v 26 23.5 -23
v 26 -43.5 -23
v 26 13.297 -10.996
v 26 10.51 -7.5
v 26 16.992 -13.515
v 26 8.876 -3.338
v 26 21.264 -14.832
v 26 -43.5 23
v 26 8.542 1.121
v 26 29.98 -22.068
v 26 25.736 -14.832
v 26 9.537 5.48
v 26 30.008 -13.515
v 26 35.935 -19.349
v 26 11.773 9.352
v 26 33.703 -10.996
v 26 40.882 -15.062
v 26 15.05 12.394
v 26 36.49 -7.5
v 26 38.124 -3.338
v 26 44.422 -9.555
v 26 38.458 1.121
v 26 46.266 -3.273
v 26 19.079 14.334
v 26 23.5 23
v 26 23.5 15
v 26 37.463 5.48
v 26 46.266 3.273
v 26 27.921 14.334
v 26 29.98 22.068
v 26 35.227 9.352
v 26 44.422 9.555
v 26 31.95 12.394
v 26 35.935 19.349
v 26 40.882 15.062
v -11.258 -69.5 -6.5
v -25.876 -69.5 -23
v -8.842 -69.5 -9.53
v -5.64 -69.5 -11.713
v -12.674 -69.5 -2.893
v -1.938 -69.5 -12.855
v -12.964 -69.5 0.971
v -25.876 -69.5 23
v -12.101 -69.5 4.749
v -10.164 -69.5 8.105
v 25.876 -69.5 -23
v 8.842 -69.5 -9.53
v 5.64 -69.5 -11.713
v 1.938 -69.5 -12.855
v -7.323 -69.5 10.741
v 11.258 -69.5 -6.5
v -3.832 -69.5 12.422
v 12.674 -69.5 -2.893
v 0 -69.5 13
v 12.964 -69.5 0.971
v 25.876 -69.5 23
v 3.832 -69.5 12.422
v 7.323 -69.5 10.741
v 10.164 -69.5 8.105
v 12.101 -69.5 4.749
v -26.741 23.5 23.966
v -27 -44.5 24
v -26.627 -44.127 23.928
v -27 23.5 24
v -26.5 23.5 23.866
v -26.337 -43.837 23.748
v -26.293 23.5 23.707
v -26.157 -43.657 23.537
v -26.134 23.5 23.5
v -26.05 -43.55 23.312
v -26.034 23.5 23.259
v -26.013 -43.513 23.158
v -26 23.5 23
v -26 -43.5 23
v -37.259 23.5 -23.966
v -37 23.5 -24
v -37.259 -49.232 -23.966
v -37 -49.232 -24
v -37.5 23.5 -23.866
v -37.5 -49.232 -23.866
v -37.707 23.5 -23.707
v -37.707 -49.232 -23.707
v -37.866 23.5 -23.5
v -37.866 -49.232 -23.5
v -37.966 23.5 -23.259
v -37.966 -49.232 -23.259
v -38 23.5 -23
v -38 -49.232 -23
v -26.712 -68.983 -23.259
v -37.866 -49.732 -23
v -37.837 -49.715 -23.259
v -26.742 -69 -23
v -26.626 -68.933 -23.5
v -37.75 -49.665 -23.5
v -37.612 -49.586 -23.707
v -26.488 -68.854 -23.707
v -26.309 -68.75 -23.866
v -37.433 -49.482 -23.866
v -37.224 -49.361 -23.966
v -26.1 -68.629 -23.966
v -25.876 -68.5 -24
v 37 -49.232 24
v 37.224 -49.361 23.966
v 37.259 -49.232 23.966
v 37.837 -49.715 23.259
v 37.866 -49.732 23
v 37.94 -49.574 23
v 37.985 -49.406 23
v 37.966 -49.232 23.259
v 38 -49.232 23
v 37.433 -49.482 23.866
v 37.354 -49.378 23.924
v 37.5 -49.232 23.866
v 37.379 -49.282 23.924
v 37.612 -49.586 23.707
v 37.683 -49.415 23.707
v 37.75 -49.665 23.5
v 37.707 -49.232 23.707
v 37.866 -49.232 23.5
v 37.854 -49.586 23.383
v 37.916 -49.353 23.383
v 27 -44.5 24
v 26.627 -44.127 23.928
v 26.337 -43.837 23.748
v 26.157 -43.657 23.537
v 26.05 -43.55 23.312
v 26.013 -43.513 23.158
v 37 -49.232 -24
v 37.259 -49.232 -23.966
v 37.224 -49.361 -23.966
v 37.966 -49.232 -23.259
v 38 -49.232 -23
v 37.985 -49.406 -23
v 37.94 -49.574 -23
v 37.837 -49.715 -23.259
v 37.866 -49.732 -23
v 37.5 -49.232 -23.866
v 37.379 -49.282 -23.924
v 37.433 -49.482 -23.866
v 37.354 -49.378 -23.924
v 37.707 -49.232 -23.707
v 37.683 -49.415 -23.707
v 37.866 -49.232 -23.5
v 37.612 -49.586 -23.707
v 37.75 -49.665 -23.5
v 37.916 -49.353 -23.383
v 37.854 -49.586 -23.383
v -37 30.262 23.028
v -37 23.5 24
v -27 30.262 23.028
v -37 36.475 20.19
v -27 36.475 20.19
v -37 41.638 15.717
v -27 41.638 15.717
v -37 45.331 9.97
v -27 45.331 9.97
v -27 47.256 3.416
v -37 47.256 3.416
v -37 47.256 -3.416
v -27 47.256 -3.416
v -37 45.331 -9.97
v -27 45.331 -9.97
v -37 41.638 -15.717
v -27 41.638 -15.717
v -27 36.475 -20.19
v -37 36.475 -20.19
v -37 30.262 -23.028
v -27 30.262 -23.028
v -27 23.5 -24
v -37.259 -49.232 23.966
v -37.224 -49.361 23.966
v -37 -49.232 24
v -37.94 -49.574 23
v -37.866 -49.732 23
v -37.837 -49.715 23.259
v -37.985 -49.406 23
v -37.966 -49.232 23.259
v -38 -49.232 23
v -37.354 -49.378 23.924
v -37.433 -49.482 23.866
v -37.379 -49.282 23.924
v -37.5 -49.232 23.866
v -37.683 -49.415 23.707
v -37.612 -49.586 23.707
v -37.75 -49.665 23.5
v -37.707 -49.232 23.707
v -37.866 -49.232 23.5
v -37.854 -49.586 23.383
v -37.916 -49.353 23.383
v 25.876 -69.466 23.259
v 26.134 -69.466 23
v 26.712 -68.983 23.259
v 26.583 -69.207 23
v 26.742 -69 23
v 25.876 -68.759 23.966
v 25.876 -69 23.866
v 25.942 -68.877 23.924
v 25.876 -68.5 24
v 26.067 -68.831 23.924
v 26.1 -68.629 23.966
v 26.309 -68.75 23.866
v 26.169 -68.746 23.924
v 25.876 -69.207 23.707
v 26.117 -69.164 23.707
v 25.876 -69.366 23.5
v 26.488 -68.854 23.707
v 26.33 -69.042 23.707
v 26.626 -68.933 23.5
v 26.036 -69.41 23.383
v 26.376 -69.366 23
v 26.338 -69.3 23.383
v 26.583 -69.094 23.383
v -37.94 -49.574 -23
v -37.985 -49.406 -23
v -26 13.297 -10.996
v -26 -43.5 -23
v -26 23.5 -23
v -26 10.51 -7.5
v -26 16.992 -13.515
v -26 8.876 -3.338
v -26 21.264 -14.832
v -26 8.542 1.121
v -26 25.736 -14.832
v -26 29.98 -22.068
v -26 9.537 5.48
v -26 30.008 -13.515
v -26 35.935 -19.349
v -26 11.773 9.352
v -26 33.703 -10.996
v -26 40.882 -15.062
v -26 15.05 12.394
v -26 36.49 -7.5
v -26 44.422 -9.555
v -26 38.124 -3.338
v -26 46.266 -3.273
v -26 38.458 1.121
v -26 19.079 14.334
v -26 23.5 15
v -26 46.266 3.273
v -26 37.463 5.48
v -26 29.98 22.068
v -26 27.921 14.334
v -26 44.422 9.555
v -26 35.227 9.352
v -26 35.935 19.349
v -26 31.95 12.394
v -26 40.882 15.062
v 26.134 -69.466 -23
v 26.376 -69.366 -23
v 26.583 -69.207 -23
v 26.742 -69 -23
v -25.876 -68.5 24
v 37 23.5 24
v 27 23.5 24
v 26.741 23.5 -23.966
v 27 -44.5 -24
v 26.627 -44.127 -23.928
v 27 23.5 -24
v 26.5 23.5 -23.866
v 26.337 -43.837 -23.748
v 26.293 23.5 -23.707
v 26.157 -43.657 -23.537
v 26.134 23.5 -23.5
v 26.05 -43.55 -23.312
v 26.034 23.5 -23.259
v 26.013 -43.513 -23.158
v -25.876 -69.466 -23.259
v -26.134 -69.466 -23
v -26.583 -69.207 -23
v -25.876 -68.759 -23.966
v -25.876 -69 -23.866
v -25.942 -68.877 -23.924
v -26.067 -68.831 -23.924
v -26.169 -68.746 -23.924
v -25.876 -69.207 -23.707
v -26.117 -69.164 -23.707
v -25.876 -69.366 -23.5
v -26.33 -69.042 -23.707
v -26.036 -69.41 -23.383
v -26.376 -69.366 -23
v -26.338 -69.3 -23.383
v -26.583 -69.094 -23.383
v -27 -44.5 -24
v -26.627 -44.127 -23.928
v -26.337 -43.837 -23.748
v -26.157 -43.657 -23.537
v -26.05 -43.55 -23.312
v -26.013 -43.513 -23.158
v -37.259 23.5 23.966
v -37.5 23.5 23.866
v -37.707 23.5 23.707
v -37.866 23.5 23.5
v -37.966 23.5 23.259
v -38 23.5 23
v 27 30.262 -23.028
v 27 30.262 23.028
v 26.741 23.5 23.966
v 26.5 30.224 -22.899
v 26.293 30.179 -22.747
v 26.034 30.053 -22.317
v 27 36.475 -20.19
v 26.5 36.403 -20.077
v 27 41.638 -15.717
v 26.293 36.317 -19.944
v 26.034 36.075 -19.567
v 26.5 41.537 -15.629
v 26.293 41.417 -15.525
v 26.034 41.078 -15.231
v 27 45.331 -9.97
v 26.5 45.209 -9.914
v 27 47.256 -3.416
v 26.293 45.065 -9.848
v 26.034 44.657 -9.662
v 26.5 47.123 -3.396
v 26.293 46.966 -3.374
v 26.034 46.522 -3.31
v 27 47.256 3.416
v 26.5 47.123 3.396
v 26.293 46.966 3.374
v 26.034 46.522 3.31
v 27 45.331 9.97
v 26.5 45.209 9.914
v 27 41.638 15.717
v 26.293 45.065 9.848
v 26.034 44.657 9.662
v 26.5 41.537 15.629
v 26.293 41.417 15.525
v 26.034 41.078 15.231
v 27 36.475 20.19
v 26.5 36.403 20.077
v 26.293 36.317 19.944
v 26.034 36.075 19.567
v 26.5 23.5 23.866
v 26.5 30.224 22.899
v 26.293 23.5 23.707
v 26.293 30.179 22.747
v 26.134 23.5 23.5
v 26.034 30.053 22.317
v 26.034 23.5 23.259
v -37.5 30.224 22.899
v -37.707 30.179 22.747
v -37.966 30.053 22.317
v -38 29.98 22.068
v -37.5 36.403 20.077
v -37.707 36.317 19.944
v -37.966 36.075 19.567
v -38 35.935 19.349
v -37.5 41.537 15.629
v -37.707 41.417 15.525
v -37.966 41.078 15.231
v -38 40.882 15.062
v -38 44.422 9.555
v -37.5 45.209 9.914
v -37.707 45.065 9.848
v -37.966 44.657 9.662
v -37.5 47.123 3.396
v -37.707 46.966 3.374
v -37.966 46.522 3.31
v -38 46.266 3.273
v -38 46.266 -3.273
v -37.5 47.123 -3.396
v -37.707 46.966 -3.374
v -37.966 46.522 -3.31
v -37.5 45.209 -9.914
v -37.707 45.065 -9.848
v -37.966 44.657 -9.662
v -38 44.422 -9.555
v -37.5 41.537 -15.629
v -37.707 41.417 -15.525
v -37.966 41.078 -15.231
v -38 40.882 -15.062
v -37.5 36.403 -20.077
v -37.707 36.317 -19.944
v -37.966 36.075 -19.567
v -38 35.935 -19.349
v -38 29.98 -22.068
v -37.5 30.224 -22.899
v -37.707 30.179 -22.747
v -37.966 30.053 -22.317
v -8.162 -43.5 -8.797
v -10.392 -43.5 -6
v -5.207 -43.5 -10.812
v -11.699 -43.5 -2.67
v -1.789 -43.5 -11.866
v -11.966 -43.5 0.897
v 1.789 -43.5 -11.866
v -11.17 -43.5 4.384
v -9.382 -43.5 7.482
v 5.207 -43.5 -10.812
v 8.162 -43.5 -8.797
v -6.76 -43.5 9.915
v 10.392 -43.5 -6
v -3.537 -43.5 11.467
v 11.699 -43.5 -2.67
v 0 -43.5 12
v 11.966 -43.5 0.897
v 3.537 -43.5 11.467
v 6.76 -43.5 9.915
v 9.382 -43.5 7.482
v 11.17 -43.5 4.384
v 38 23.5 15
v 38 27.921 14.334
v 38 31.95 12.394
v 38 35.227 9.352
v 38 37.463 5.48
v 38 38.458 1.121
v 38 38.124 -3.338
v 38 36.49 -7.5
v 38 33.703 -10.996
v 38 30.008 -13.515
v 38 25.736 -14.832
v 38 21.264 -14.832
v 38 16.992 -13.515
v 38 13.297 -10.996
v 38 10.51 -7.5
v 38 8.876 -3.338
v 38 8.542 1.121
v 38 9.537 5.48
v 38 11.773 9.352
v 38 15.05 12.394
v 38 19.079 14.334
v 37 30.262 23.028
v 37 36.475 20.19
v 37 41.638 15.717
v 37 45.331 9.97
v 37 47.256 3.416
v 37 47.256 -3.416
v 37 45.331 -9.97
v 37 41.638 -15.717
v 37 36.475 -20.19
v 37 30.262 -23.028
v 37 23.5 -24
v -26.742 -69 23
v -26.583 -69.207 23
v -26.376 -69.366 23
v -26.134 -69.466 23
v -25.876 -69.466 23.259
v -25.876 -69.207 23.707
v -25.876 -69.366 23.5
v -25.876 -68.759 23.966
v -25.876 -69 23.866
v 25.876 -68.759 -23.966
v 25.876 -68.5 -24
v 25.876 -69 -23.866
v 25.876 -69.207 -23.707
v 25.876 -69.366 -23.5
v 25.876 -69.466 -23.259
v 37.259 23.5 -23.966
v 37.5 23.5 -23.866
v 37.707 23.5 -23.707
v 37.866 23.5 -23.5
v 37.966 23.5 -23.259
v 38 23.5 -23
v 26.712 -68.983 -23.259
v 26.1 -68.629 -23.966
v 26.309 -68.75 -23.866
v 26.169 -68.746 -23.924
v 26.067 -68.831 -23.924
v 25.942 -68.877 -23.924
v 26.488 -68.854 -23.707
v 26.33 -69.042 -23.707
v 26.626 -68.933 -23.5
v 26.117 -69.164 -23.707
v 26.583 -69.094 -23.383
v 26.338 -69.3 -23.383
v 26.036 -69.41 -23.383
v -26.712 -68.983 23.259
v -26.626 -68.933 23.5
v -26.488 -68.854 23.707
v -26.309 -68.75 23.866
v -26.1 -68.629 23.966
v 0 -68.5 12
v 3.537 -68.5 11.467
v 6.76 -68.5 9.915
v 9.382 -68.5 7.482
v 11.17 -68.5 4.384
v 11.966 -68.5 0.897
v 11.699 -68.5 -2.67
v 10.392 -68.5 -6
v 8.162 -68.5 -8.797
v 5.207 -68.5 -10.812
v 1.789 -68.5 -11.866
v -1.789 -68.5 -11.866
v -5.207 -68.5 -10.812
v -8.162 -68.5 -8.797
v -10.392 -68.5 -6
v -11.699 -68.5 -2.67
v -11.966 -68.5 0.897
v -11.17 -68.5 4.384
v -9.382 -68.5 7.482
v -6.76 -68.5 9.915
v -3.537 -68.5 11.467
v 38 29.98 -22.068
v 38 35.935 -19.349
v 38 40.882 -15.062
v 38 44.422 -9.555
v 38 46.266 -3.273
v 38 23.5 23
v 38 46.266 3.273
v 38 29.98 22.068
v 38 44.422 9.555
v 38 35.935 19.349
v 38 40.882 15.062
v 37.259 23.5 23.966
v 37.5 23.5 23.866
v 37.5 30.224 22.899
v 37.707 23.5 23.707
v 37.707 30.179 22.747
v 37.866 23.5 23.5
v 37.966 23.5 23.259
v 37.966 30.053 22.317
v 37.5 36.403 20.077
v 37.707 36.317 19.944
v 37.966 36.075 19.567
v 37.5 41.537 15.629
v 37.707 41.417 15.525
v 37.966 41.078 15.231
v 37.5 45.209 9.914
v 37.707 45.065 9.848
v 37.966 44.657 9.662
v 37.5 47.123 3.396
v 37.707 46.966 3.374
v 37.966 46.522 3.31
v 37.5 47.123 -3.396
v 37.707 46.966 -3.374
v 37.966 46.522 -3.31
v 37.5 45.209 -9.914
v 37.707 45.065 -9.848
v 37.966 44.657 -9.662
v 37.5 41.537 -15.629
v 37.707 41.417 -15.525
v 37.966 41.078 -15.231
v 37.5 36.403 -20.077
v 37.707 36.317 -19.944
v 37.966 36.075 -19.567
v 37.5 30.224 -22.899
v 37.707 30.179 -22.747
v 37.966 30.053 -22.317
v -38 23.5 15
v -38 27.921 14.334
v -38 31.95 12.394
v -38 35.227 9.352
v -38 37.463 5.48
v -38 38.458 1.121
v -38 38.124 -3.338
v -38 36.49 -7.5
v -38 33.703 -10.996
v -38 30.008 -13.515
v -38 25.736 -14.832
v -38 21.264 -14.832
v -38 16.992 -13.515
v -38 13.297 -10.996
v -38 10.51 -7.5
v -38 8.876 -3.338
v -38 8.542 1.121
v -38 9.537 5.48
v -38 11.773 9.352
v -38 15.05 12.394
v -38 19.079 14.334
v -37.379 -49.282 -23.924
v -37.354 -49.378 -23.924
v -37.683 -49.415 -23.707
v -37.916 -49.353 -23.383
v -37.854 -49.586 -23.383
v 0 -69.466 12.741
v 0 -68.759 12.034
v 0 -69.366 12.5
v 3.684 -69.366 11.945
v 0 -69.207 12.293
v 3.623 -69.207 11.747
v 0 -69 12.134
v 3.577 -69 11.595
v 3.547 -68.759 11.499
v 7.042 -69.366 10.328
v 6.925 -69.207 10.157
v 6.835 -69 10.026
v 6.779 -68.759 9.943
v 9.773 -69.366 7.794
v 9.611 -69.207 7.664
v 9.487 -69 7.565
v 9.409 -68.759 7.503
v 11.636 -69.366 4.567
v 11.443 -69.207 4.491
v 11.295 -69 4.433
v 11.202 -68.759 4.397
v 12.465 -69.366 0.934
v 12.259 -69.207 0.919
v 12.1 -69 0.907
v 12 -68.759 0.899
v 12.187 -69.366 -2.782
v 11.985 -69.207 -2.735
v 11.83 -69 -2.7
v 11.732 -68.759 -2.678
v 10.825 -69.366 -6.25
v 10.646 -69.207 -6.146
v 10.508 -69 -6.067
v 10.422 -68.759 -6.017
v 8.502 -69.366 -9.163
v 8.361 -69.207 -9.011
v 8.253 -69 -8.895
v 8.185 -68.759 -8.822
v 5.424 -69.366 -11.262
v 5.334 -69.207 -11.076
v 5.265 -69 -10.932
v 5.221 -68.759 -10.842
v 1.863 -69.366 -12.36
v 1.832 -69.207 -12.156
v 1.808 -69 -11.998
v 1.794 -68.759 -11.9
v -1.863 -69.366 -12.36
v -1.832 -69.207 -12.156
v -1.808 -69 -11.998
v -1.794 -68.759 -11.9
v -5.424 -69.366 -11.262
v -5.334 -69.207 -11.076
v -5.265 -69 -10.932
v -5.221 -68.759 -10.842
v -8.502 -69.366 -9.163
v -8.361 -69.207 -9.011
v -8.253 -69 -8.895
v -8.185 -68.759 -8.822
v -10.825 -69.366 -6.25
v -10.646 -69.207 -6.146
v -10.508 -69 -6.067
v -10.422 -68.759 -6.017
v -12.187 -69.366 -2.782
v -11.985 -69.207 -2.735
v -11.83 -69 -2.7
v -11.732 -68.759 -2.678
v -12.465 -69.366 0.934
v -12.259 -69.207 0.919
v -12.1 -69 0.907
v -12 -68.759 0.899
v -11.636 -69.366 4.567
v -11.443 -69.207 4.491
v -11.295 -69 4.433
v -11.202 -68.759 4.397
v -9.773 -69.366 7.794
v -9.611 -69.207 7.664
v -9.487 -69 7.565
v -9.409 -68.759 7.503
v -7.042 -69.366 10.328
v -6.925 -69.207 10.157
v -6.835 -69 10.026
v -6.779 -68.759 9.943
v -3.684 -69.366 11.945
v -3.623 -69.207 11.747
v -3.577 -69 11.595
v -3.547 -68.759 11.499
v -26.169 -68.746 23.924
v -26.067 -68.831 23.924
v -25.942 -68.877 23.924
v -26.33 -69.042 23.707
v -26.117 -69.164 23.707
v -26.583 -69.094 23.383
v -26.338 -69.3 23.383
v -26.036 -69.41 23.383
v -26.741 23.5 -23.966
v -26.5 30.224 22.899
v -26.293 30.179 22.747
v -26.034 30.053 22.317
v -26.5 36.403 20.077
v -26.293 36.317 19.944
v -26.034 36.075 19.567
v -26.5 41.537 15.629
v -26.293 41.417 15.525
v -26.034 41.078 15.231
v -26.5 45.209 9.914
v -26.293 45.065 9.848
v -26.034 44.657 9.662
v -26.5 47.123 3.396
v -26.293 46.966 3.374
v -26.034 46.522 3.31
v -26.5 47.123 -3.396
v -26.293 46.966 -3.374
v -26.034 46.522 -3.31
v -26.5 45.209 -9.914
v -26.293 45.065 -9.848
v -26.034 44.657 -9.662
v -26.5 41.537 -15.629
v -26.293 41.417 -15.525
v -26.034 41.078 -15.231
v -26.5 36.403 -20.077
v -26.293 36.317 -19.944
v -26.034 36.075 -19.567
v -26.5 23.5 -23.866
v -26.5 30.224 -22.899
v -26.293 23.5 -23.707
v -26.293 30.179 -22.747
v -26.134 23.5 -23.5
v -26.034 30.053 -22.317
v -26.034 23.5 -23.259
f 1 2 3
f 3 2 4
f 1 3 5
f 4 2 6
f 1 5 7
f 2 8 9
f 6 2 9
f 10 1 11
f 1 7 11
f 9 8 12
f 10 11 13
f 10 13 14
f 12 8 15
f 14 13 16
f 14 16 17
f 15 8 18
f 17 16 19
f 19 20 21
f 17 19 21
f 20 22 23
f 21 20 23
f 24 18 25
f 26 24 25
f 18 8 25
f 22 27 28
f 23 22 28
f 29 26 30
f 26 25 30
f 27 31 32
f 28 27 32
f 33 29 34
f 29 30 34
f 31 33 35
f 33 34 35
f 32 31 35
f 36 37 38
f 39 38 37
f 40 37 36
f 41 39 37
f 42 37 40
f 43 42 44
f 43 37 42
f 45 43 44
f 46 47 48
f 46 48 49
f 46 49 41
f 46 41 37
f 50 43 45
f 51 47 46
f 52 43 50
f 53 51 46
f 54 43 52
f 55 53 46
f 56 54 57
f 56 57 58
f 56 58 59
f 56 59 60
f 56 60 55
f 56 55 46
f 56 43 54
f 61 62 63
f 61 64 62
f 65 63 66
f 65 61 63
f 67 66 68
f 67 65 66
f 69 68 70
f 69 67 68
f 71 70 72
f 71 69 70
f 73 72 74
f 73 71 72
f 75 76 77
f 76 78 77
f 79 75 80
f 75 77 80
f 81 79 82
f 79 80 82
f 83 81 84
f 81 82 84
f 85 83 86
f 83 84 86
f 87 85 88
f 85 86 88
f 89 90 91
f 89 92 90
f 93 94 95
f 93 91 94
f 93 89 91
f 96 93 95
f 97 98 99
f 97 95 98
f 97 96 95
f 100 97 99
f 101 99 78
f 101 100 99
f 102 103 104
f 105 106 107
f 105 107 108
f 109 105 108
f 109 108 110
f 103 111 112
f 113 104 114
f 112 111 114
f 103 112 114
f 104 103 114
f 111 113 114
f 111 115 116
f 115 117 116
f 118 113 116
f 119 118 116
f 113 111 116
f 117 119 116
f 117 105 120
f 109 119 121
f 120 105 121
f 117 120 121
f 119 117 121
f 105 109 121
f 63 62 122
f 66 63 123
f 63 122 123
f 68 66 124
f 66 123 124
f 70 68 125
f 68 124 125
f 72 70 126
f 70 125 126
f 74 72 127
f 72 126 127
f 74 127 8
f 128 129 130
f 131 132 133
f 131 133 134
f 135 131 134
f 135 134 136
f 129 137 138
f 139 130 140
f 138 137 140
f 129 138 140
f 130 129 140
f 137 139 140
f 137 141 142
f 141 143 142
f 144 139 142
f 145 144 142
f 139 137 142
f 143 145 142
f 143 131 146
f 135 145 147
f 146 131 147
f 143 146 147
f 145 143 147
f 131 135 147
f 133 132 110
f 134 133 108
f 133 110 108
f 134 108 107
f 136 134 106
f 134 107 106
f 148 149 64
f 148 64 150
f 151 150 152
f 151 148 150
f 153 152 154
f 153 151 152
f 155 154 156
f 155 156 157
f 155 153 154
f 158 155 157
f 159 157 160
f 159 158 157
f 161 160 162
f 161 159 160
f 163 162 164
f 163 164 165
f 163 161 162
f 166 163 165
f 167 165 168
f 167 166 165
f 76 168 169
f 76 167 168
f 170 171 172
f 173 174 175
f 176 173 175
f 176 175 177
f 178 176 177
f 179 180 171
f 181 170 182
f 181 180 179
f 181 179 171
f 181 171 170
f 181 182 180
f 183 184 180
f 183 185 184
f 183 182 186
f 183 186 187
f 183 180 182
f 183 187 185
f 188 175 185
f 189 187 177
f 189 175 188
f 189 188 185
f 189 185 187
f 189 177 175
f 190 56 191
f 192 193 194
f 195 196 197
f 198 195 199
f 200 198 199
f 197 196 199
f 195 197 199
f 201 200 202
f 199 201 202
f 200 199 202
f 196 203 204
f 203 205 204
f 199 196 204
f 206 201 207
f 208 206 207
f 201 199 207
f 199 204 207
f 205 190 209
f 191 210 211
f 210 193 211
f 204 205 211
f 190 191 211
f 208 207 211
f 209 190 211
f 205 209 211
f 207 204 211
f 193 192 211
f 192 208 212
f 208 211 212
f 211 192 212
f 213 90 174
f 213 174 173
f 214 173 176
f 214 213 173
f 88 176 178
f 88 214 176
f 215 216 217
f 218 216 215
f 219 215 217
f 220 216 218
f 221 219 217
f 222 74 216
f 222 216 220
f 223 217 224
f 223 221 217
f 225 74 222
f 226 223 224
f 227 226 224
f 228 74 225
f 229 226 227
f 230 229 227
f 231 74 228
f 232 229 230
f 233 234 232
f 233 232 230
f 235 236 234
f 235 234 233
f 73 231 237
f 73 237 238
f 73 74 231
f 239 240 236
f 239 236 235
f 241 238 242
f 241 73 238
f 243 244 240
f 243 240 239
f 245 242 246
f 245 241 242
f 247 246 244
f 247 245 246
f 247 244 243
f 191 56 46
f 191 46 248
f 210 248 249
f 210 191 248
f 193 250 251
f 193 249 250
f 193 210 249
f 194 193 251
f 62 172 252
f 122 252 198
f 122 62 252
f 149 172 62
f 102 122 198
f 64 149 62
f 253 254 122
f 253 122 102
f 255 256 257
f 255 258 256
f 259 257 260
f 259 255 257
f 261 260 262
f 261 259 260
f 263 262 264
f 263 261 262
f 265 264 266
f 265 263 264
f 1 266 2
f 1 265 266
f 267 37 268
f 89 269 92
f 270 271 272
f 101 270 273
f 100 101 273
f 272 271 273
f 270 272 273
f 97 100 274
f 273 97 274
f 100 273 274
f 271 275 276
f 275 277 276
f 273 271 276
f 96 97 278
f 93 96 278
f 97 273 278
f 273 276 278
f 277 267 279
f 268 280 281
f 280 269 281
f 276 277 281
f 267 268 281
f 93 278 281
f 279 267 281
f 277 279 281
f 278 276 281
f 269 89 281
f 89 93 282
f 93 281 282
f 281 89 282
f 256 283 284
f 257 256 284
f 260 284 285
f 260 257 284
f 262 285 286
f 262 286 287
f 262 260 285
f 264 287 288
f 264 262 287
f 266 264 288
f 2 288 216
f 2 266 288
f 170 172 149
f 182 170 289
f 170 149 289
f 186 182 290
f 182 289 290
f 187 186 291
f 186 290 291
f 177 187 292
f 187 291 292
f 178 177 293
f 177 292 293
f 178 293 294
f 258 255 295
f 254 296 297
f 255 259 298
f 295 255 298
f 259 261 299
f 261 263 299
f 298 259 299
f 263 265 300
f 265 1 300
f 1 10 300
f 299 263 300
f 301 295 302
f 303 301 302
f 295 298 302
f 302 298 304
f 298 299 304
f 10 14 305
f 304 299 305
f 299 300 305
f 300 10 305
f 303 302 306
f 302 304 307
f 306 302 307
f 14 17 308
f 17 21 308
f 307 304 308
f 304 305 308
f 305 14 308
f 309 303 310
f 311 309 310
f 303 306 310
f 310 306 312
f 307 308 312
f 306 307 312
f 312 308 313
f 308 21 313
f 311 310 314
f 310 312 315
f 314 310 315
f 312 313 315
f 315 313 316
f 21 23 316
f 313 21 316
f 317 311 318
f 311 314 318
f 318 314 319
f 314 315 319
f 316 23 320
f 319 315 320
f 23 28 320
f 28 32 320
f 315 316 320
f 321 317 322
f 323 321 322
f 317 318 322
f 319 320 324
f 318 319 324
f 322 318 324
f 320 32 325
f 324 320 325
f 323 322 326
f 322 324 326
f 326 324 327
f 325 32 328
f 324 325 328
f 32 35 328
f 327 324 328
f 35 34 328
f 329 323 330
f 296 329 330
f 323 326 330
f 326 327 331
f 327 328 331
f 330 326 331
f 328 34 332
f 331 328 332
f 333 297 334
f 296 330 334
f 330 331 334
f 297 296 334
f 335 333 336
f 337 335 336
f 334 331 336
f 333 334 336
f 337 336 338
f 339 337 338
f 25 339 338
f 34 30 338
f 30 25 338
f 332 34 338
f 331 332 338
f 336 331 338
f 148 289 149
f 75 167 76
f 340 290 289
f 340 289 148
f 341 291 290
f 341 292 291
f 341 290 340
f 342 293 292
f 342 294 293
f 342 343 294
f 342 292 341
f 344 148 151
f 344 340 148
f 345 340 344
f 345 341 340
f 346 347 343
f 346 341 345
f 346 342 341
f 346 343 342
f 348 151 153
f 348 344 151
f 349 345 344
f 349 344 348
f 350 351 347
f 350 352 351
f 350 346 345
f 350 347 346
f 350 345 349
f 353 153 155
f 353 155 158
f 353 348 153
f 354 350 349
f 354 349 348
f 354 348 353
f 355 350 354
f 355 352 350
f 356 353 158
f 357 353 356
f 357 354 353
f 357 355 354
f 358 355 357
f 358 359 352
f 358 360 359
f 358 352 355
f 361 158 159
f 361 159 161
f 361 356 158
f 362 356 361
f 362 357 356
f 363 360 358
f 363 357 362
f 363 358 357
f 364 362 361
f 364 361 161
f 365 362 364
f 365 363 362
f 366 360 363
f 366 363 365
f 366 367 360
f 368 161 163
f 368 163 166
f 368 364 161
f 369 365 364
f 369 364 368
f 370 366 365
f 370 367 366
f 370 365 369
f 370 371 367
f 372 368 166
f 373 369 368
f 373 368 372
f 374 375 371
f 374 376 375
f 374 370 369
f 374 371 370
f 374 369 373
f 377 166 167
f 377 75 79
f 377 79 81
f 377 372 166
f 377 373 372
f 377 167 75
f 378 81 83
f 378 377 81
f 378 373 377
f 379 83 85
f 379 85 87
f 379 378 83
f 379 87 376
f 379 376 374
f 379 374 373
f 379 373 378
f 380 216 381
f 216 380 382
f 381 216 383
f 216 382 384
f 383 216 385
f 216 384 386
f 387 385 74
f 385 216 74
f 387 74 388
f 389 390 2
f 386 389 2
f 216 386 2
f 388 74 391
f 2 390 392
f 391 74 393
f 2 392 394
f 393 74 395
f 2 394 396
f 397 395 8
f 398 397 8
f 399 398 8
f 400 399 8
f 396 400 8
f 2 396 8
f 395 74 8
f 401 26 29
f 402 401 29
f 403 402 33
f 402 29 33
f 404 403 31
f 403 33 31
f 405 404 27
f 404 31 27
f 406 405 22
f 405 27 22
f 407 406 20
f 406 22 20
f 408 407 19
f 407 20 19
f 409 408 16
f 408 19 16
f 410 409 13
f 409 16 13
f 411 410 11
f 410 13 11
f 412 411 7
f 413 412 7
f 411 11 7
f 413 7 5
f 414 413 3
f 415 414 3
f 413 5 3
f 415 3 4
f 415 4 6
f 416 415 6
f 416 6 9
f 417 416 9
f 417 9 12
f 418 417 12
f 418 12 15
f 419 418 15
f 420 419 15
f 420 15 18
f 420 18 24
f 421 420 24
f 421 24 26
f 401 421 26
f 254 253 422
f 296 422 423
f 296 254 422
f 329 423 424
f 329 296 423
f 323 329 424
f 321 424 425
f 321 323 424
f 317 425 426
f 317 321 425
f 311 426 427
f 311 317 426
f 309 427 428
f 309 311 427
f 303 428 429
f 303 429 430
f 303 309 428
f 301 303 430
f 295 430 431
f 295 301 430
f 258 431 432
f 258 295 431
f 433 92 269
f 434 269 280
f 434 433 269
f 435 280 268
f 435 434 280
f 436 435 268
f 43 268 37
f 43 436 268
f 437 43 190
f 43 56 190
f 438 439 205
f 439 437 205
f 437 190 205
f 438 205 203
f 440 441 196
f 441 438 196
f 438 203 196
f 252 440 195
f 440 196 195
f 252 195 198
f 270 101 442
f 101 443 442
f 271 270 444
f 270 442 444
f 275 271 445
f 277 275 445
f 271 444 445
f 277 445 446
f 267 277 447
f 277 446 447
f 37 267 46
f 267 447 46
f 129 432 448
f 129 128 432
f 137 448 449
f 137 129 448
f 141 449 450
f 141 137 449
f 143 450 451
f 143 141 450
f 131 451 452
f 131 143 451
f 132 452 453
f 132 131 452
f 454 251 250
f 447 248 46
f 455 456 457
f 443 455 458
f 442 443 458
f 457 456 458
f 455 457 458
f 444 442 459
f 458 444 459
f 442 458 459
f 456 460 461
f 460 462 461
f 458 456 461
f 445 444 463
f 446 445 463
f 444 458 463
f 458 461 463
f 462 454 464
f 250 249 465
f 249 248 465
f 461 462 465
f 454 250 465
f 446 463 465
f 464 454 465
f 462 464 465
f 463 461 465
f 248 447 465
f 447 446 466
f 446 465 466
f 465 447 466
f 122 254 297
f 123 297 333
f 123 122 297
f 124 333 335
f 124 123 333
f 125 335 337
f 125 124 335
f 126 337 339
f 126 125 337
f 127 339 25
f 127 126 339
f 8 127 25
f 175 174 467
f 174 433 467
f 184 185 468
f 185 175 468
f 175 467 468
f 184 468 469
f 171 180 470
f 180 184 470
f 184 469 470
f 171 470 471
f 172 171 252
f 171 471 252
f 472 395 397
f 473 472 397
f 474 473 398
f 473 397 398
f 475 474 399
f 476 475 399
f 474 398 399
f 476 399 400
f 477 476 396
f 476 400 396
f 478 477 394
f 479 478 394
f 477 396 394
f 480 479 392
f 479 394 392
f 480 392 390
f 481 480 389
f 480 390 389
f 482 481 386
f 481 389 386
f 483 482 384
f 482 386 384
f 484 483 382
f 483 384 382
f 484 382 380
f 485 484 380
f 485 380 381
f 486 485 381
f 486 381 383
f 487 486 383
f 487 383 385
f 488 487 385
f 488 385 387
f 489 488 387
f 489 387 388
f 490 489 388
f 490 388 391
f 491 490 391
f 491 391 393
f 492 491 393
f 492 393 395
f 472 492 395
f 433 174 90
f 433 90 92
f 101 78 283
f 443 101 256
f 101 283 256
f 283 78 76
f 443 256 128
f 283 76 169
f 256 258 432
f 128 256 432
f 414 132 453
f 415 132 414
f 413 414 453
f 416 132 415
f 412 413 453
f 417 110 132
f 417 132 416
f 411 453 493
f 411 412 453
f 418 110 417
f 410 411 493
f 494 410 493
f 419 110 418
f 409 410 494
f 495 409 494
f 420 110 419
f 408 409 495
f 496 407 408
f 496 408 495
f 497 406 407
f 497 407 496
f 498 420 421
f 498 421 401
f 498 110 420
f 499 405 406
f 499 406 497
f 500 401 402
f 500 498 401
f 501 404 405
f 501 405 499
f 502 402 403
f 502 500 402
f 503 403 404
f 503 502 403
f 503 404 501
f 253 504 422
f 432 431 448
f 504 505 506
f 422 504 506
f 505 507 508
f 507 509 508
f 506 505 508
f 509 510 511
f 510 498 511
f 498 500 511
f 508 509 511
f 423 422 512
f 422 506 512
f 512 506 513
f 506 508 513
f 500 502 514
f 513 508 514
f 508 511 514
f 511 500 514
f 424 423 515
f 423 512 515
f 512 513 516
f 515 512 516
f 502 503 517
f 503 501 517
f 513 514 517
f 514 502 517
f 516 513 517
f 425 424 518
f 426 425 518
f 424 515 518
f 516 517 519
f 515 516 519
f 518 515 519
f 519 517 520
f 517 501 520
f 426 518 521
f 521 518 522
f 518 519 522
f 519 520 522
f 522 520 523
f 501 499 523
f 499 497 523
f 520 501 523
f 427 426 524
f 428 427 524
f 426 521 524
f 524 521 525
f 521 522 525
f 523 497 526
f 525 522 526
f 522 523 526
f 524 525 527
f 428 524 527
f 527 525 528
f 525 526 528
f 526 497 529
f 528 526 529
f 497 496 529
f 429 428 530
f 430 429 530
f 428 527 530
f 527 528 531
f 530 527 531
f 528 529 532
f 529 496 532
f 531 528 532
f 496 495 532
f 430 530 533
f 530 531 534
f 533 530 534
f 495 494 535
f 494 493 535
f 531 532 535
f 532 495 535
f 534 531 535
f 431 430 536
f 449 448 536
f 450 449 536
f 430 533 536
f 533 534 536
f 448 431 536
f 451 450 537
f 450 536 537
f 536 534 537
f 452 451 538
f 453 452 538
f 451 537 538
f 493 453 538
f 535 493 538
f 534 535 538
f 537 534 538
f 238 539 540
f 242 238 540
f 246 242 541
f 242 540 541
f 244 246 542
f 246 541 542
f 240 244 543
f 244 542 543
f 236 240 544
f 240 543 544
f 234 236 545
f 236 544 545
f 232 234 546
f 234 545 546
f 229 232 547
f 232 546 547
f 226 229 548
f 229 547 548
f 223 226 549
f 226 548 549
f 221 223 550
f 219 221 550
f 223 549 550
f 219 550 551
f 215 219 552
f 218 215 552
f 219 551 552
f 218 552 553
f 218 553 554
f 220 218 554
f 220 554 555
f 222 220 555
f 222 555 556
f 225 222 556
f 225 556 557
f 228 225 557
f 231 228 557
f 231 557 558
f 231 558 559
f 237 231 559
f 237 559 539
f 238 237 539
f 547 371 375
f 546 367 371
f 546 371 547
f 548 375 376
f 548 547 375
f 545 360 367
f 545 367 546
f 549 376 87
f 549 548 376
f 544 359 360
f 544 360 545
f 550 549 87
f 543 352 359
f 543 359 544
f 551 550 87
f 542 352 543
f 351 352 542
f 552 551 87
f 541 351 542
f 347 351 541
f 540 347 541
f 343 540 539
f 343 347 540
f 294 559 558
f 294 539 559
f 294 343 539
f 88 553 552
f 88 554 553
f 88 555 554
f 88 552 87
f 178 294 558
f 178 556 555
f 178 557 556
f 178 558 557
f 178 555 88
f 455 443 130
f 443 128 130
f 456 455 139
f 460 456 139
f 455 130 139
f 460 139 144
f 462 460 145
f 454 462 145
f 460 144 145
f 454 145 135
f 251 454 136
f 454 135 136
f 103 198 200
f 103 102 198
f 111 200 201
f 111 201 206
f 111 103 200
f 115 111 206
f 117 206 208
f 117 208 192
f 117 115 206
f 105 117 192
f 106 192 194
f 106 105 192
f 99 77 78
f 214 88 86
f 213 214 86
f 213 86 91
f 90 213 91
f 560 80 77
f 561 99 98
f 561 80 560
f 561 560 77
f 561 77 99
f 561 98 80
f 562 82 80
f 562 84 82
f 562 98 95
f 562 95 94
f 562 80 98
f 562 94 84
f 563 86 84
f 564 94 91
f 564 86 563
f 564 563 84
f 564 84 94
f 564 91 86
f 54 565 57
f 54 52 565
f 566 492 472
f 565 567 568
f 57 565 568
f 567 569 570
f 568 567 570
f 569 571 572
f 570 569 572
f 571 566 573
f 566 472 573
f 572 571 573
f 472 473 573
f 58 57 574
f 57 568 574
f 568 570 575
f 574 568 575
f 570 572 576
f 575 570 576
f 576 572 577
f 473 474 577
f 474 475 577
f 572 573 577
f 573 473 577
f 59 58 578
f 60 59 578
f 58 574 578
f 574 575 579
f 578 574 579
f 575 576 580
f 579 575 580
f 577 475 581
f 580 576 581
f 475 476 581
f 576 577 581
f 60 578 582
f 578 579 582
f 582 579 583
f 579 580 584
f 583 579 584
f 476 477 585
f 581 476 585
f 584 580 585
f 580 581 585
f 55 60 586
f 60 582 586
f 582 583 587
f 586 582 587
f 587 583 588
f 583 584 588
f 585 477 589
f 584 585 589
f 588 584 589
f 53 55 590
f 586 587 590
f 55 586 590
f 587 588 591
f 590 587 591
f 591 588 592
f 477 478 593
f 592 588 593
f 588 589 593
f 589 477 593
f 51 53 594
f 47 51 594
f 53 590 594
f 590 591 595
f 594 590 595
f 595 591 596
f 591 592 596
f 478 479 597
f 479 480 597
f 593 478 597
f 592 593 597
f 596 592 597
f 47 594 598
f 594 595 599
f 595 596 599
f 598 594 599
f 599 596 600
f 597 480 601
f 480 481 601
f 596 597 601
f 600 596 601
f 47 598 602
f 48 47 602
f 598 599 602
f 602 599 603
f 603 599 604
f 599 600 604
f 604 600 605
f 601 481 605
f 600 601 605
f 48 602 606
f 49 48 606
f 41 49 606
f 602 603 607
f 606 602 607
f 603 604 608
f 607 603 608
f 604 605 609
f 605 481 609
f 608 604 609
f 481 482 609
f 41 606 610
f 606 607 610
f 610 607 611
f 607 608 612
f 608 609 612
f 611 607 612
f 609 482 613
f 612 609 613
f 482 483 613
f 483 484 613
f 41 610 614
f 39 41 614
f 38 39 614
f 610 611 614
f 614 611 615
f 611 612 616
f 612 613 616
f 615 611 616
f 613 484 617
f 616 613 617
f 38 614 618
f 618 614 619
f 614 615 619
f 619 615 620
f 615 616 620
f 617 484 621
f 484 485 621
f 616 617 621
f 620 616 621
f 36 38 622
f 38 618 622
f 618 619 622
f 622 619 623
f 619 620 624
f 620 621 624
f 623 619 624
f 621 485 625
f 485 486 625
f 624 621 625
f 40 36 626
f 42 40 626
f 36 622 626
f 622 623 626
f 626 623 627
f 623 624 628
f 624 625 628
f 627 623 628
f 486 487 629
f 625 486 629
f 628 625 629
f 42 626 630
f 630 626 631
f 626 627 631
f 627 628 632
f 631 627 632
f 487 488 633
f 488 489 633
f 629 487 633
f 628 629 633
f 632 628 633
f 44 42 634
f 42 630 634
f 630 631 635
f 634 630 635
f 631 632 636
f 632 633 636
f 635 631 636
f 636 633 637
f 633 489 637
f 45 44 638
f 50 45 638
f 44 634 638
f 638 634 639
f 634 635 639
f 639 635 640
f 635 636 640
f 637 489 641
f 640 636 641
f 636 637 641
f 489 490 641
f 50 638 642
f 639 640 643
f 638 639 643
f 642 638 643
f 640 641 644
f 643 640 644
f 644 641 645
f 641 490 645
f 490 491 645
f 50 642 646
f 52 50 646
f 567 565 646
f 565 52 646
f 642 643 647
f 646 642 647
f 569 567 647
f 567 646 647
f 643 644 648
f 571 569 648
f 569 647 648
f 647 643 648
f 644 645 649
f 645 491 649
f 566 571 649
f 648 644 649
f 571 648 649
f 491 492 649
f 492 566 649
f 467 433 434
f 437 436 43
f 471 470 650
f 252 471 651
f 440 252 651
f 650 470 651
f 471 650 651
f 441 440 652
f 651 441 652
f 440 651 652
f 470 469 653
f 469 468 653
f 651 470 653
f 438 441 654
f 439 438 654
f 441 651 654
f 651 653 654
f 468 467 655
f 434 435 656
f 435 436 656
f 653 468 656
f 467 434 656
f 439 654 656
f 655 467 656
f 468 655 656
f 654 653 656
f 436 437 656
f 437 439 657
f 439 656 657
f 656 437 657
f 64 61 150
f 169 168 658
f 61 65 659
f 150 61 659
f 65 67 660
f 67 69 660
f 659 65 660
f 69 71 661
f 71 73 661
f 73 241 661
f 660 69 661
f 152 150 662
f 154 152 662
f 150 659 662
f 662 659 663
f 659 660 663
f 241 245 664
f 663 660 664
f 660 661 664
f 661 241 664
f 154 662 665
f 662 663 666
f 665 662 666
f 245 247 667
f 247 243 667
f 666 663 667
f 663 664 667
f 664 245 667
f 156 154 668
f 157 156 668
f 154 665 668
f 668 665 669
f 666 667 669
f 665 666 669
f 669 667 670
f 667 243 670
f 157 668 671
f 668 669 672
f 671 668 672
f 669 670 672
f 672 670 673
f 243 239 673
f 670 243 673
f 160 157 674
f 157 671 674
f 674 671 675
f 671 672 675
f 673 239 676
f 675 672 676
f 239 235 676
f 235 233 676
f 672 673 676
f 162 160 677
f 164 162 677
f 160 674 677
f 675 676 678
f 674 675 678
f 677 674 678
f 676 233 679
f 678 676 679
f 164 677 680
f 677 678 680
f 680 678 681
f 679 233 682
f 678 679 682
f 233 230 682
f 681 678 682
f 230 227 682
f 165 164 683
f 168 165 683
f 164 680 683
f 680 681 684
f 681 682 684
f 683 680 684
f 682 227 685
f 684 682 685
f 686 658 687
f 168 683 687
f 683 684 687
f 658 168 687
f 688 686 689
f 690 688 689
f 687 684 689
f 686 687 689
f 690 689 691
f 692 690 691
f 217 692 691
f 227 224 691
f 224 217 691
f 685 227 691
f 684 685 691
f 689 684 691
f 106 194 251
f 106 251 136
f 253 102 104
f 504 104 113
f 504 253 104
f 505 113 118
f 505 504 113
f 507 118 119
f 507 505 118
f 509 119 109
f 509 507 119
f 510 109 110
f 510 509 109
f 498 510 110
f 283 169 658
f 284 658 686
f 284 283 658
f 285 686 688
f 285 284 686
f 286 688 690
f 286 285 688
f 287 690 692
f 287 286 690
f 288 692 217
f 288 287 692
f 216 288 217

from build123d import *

# Parameters (mm, degrees)
BOSS_EXTRUDE1_DEPTH = 24
SKETCH2_W           = 52
SKETCH2_H           = 93
CUT_EXTRUDE1_DEPTH  = 48
CUT_EXTRUDE2_DEPTH  = 105
SKETCH4_R           = 15
CUT_EXTRUDE3_DEPTH  = 105
SKETCH5_R           = 12
CUT_EXTRUDE4_DEPTH  = 105
FILLET1_R           = 1


with BuildPart() as part:
    # Sketch1 → Boss-Extrude1 (new, symmetric)
    with BuildSketch(Plane.XY):
        Polygon((-38, -49.5), (-26.452994616, -69.5), (26.452994616, -69.5), (38, -49.5), (38, 49.5), (-38, 49.5), align=None)
    extrude(amount=BOSS_EXTRUDE1_DEPTH, both=True)

    # Sketch2 → Cut-Extrude1 (cut)
    with BuildSketch(Plane.XY.offset(24)):
        with Locations((0, 3)):
            Rectangle(SKETCH2_W, SKETCH2_H)
    extrude(amount=-CUT_EXTRUDE1_DEPTH, mode=Mode.SUBTRACT)

    # Sketch3 → Cut-Extrude2 (cut)
    with BuildSketch(Plane.ZY.offset(38)):
        with BuildLine():
            Line((-24, 23.5), (-24, 49.5))
            Line((-24, 49.5), (24, 49.5))
            Line((24, 49.5), (24, 23.5))
            ThreePointArc((24, 23.5), (0, 47.5), (-24, 23.5))
        make_face()
    extrude(amount=-CUT_EXTRUDE2_DEPTH, mode=Mode.SUBTRACT)

    # Sketch4 → Cut-Extrude3 (cut)
    with BuildSketch(Plane.ZY.offset(38)):
        with Locations((0, 23.5)):
            Circle(SKETCH4_R)
    extrude(amount=-CUT_EXTRUDE3_DEPTH, mode=Mode.SUBTRACT)

    # Sketch5 → Cut-Extrude4 (cut)
    with BuildSketch(Plane(origin=(0, -43.5, 0), x_dir=(1, 0, 0), z_dir=(0, 1, 0))):
        with Locations(Location((0, 0, 0), (0, 0, 270))):
            Circle(SKETCH5_R)
    extrude(amount=-CUT_EXTRUDE4_DEPTH, mode=Mode.SUBTRACT)

    # Fillet1
    fillet1_edges = [part.edges().sort_by_distance(p)[0] for p in [
        (38, -49.5, 0),
        (26.452994616, -69.5, 0),
        (-26.452994616, -69.5, 0),
        (-38, -49.5, 0),
        (-32.226497308, -59.5, 24),
        (0, -69.5, 24),
        (32.226497308, -59.5, 24),
        (26, -10, -24),
        (0, -43.5, -24),
        (0, -43.5, 24),
        (26, -10, 24),
        (-26, -10, 24),
        (-26, -10, -24),
        (-26, 47.5, 0),
        (-38, -13, -24),
        (-38, -13, 24),
        (38, 47.5, 0),
        (26, 47.5, 0),
        (38, -13, 24),
        (-38, 47.5, 0),
        (32.226497308, -59.5, -24),
        (0, -69.5, -24),
        (-32.226497308, -59.5, -24),
        (0, -69.5, -12),
        (38, -13, -24),
    ]]
    fillet(fillet1_edges, radius=FILLET1_R)


solid = part.part
